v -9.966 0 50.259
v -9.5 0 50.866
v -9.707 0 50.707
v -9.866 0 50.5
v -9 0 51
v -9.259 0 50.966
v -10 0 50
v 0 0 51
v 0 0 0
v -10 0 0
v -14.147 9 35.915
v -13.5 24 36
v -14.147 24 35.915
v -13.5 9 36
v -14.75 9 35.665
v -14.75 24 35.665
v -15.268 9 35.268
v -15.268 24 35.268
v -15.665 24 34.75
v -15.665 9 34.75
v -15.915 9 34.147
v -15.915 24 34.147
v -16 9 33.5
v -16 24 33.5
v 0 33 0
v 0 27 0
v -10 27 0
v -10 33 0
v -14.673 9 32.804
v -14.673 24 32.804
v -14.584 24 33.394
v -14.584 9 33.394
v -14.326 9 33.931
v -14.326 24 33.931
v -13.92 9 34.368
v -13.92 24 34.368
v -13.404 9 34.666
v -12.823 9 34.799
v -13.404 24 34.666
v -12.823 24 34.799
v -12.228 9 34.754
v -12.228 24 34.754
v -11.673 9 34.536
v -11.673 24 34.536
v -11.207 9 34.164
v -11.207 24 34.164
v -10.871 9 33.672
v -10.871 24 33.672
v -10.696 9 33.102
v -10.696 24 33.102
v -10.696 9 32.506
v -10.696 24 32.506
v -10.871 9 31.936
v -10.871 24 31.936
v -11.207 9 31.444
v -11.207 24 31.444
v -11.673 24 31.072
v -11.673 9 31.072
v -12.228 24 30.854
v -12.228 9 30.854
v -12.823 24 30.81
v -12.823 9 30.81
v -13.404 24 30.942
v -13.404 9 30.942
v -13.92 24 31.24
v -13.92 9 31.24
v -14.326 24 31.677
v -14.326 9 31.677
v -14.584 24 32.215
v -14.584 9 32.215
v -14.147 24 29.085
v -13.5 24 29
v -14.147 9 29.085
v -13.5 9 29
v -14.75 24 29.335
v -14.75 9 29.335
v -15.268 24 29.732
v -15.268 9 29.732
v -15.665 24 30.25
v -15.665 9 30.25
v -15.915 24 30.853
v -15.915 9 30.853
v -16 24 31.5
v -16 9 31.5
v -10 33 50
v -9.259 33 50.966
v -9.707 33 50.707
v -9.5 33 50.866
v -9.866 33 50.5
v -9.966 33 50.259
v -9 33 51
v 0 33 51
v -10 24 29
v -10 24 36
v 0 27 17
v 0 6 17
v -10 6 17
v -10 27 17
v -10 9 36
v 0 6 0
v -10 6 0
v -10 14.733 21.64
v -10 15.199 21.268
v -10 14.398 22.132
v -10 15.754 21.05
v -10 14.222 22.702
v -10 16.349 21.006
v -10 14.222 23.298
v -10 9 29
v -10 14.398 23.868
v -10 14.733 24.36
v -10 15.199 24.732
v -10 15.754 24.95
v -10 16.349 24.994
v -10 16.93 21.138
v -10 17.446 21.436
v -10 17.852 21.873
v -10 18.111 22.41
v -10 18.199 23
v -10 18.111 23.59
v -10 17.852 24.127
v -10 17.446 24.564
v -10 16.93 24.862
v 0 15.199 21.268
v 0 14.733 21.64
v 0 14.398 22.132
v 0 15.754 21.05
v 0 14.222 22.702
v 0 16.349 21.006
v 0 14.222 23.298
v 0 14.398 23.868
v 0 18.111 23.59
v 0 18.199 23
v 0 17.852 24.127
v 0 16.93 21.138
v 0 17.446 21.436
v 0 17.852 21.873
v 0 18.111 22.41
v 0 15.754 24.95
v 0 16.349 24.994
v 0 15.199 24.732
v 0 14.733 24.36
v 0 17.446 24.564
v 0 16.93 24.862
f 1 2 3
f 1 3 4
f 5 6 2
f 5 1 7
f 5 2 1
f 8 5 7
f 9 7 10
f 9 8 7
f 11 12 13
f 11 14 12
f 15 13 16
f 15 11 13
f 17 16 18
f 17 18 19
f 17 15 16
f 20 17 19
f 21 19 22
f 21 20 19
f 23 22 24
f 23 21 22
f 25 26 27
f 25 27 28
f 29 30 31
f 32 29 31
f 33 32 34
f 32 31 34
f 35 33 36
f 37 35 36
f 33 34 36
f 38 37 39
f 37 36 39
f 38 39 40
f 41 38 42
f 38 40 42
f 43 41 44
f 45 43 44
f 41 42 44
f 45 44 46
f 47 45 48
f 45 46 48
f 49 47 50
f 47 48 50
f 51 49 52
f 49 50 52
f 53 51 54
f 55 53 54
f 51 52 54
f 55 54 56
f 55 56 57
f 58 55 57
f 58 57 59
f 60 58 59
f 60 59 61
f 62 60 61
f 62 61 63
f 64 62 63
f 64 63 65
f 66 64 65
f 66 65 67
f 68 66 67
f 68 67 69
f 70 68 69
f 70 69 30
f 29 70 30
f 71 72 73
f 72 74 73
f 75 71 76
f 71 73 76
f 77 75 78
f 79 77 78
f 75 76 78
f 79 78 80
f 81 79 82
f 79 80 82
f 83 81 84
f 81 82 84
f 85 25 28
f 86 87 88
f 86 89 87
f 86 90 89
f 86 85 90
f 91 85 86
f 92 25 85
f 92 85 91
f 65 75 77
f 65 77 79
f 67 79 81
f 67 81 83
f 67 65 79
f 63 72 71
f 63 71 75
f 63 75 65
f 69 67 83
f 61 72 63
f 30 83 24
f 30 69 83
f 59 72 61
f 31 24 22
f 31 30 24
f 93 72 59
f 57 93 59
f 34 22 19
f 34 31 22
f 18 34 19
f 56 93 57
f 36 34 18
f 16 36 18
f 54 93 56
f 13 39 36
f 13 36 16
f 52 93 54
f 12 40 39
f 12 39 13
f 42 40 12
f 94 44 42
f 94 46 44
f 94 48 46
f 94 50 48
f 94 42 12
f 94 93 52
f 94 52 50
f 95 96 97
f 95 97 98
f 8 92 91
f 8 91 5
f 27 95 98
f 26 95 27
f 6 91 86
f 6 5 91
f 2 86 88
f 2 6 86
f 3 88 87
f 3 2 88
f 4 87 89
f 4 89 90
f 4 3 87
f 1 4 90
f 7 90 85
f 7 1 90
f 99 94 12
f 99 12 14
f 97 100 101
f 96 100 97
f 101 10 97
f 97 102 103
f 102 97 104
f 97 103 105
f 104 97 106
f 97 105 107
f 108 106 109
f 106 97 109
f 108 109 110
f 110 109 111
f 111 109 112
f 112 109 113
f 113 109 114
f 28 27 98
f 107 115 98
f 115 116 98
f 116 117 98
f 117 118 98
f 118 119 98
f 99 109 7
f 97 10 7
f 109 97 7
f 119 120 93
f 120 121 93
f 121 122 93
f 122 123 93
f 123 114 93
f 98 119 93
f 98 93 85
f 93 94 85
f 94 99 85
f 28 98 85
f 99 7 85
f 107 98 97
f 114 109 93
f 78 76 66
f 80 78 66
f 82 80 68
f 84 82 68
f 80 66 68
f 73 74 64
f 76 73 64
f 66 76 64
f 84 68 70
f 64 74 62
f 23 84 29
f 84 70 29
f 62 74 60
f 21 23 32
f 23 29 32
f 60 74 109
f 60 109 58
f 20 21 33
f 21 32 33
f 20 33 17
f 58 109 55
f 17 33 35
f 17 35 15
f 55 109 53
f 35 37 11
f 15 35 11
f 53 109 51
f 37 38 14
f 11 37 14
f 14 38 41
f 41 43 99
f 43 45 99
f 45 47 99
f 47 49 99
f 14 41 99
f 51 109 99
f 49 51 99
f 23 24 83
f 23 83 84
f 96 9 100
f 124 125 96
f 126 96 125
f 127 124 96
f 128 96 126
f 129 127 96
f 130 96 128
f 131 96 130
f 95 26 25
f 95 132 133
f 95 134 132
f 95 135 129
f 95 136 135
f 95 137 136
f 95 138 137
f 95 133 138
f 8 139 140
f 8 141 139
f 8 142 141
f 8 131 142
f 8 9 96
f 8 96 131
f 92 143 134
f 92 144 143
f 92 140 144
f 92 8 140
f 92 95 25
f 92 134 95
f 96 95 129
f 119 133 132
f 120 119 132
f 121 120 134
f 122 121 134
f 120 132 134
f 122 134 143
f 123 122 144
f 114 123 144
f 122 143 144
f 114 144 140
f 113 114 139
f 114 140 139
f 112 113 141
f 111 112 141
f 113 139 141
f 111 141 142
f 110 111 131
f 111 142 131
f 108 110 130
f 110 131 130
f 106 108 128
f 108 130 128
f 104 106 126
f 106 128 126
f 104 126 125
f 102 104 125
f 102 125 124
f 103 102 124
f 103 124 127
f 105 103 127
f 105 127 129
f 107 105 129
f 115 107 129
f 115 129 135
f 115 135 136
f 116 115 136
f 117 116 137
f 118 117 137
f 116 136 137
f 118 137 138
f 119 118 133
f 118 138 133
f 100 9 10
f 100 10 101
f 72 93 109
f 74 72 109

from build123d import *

# Parameters (mm, degrees)
F0_R     = 2
F1_DEPTH = 10
F2_R     = 1
F3_W     = 15
F3_H     = 7
F4_DEPTH = 6
F5_R     = 2.5
F6_R     = 2
F7_DEPTH = 25.4


with BuildPart() as f1:
    # F0 (on Right) → F1 (new body)
    with BuildSketch(Plane.YZ):
        Polygon((0, 51), (0, 0), (6, 0), (6, 17), (27, 17), (27, 0), (33, 0), (33, 51), align=None)
        with Locations((16.199438, 23)):
            Circle(F0_R, mode=Mode.SUBTRACT)
    extrude(amount=-F1_DEPTH)

    # F2
    f2_edges = [f1.edges().sort_by_distance(p)[0] for p in [
        (-10, 16.5, 51),
    ]]
    fillet(f2_edges, radius=F2_R)

    # F3 (on face) → F4 (join)
    with BuildSketch(Plane(origin=(-10, 0, 0), x_dir=(0, -1, 0), z_dir=(-1, 0, 0))):
        with Locations((-16.5, 32.5)):
            Rectangle(F3_W, F3_H)
    extrude(amount=F4_DEPTH)

    # F5
    f5_edges = [f1.edges().sort_by_distance(p)[0] for p in [
        (-16, 16.5, 36),
        (-16, 16.5, 29),
    ]]
    fillet(f5_edges, radius=F5_R)

    # F6 (on face) → F7 (cut)
    with BuildSketch(Plane(origin=(0, 24, 0), x_dir=(-1, 0, 0), z_dir=(0, 1, 0))):
        with Locations((12.673163, 32.804124)):
            Circle(F6_R)
    extrude(amount=-F7_DEPTH, mode=Mode.SUBTRACT)


solid = f1.part
